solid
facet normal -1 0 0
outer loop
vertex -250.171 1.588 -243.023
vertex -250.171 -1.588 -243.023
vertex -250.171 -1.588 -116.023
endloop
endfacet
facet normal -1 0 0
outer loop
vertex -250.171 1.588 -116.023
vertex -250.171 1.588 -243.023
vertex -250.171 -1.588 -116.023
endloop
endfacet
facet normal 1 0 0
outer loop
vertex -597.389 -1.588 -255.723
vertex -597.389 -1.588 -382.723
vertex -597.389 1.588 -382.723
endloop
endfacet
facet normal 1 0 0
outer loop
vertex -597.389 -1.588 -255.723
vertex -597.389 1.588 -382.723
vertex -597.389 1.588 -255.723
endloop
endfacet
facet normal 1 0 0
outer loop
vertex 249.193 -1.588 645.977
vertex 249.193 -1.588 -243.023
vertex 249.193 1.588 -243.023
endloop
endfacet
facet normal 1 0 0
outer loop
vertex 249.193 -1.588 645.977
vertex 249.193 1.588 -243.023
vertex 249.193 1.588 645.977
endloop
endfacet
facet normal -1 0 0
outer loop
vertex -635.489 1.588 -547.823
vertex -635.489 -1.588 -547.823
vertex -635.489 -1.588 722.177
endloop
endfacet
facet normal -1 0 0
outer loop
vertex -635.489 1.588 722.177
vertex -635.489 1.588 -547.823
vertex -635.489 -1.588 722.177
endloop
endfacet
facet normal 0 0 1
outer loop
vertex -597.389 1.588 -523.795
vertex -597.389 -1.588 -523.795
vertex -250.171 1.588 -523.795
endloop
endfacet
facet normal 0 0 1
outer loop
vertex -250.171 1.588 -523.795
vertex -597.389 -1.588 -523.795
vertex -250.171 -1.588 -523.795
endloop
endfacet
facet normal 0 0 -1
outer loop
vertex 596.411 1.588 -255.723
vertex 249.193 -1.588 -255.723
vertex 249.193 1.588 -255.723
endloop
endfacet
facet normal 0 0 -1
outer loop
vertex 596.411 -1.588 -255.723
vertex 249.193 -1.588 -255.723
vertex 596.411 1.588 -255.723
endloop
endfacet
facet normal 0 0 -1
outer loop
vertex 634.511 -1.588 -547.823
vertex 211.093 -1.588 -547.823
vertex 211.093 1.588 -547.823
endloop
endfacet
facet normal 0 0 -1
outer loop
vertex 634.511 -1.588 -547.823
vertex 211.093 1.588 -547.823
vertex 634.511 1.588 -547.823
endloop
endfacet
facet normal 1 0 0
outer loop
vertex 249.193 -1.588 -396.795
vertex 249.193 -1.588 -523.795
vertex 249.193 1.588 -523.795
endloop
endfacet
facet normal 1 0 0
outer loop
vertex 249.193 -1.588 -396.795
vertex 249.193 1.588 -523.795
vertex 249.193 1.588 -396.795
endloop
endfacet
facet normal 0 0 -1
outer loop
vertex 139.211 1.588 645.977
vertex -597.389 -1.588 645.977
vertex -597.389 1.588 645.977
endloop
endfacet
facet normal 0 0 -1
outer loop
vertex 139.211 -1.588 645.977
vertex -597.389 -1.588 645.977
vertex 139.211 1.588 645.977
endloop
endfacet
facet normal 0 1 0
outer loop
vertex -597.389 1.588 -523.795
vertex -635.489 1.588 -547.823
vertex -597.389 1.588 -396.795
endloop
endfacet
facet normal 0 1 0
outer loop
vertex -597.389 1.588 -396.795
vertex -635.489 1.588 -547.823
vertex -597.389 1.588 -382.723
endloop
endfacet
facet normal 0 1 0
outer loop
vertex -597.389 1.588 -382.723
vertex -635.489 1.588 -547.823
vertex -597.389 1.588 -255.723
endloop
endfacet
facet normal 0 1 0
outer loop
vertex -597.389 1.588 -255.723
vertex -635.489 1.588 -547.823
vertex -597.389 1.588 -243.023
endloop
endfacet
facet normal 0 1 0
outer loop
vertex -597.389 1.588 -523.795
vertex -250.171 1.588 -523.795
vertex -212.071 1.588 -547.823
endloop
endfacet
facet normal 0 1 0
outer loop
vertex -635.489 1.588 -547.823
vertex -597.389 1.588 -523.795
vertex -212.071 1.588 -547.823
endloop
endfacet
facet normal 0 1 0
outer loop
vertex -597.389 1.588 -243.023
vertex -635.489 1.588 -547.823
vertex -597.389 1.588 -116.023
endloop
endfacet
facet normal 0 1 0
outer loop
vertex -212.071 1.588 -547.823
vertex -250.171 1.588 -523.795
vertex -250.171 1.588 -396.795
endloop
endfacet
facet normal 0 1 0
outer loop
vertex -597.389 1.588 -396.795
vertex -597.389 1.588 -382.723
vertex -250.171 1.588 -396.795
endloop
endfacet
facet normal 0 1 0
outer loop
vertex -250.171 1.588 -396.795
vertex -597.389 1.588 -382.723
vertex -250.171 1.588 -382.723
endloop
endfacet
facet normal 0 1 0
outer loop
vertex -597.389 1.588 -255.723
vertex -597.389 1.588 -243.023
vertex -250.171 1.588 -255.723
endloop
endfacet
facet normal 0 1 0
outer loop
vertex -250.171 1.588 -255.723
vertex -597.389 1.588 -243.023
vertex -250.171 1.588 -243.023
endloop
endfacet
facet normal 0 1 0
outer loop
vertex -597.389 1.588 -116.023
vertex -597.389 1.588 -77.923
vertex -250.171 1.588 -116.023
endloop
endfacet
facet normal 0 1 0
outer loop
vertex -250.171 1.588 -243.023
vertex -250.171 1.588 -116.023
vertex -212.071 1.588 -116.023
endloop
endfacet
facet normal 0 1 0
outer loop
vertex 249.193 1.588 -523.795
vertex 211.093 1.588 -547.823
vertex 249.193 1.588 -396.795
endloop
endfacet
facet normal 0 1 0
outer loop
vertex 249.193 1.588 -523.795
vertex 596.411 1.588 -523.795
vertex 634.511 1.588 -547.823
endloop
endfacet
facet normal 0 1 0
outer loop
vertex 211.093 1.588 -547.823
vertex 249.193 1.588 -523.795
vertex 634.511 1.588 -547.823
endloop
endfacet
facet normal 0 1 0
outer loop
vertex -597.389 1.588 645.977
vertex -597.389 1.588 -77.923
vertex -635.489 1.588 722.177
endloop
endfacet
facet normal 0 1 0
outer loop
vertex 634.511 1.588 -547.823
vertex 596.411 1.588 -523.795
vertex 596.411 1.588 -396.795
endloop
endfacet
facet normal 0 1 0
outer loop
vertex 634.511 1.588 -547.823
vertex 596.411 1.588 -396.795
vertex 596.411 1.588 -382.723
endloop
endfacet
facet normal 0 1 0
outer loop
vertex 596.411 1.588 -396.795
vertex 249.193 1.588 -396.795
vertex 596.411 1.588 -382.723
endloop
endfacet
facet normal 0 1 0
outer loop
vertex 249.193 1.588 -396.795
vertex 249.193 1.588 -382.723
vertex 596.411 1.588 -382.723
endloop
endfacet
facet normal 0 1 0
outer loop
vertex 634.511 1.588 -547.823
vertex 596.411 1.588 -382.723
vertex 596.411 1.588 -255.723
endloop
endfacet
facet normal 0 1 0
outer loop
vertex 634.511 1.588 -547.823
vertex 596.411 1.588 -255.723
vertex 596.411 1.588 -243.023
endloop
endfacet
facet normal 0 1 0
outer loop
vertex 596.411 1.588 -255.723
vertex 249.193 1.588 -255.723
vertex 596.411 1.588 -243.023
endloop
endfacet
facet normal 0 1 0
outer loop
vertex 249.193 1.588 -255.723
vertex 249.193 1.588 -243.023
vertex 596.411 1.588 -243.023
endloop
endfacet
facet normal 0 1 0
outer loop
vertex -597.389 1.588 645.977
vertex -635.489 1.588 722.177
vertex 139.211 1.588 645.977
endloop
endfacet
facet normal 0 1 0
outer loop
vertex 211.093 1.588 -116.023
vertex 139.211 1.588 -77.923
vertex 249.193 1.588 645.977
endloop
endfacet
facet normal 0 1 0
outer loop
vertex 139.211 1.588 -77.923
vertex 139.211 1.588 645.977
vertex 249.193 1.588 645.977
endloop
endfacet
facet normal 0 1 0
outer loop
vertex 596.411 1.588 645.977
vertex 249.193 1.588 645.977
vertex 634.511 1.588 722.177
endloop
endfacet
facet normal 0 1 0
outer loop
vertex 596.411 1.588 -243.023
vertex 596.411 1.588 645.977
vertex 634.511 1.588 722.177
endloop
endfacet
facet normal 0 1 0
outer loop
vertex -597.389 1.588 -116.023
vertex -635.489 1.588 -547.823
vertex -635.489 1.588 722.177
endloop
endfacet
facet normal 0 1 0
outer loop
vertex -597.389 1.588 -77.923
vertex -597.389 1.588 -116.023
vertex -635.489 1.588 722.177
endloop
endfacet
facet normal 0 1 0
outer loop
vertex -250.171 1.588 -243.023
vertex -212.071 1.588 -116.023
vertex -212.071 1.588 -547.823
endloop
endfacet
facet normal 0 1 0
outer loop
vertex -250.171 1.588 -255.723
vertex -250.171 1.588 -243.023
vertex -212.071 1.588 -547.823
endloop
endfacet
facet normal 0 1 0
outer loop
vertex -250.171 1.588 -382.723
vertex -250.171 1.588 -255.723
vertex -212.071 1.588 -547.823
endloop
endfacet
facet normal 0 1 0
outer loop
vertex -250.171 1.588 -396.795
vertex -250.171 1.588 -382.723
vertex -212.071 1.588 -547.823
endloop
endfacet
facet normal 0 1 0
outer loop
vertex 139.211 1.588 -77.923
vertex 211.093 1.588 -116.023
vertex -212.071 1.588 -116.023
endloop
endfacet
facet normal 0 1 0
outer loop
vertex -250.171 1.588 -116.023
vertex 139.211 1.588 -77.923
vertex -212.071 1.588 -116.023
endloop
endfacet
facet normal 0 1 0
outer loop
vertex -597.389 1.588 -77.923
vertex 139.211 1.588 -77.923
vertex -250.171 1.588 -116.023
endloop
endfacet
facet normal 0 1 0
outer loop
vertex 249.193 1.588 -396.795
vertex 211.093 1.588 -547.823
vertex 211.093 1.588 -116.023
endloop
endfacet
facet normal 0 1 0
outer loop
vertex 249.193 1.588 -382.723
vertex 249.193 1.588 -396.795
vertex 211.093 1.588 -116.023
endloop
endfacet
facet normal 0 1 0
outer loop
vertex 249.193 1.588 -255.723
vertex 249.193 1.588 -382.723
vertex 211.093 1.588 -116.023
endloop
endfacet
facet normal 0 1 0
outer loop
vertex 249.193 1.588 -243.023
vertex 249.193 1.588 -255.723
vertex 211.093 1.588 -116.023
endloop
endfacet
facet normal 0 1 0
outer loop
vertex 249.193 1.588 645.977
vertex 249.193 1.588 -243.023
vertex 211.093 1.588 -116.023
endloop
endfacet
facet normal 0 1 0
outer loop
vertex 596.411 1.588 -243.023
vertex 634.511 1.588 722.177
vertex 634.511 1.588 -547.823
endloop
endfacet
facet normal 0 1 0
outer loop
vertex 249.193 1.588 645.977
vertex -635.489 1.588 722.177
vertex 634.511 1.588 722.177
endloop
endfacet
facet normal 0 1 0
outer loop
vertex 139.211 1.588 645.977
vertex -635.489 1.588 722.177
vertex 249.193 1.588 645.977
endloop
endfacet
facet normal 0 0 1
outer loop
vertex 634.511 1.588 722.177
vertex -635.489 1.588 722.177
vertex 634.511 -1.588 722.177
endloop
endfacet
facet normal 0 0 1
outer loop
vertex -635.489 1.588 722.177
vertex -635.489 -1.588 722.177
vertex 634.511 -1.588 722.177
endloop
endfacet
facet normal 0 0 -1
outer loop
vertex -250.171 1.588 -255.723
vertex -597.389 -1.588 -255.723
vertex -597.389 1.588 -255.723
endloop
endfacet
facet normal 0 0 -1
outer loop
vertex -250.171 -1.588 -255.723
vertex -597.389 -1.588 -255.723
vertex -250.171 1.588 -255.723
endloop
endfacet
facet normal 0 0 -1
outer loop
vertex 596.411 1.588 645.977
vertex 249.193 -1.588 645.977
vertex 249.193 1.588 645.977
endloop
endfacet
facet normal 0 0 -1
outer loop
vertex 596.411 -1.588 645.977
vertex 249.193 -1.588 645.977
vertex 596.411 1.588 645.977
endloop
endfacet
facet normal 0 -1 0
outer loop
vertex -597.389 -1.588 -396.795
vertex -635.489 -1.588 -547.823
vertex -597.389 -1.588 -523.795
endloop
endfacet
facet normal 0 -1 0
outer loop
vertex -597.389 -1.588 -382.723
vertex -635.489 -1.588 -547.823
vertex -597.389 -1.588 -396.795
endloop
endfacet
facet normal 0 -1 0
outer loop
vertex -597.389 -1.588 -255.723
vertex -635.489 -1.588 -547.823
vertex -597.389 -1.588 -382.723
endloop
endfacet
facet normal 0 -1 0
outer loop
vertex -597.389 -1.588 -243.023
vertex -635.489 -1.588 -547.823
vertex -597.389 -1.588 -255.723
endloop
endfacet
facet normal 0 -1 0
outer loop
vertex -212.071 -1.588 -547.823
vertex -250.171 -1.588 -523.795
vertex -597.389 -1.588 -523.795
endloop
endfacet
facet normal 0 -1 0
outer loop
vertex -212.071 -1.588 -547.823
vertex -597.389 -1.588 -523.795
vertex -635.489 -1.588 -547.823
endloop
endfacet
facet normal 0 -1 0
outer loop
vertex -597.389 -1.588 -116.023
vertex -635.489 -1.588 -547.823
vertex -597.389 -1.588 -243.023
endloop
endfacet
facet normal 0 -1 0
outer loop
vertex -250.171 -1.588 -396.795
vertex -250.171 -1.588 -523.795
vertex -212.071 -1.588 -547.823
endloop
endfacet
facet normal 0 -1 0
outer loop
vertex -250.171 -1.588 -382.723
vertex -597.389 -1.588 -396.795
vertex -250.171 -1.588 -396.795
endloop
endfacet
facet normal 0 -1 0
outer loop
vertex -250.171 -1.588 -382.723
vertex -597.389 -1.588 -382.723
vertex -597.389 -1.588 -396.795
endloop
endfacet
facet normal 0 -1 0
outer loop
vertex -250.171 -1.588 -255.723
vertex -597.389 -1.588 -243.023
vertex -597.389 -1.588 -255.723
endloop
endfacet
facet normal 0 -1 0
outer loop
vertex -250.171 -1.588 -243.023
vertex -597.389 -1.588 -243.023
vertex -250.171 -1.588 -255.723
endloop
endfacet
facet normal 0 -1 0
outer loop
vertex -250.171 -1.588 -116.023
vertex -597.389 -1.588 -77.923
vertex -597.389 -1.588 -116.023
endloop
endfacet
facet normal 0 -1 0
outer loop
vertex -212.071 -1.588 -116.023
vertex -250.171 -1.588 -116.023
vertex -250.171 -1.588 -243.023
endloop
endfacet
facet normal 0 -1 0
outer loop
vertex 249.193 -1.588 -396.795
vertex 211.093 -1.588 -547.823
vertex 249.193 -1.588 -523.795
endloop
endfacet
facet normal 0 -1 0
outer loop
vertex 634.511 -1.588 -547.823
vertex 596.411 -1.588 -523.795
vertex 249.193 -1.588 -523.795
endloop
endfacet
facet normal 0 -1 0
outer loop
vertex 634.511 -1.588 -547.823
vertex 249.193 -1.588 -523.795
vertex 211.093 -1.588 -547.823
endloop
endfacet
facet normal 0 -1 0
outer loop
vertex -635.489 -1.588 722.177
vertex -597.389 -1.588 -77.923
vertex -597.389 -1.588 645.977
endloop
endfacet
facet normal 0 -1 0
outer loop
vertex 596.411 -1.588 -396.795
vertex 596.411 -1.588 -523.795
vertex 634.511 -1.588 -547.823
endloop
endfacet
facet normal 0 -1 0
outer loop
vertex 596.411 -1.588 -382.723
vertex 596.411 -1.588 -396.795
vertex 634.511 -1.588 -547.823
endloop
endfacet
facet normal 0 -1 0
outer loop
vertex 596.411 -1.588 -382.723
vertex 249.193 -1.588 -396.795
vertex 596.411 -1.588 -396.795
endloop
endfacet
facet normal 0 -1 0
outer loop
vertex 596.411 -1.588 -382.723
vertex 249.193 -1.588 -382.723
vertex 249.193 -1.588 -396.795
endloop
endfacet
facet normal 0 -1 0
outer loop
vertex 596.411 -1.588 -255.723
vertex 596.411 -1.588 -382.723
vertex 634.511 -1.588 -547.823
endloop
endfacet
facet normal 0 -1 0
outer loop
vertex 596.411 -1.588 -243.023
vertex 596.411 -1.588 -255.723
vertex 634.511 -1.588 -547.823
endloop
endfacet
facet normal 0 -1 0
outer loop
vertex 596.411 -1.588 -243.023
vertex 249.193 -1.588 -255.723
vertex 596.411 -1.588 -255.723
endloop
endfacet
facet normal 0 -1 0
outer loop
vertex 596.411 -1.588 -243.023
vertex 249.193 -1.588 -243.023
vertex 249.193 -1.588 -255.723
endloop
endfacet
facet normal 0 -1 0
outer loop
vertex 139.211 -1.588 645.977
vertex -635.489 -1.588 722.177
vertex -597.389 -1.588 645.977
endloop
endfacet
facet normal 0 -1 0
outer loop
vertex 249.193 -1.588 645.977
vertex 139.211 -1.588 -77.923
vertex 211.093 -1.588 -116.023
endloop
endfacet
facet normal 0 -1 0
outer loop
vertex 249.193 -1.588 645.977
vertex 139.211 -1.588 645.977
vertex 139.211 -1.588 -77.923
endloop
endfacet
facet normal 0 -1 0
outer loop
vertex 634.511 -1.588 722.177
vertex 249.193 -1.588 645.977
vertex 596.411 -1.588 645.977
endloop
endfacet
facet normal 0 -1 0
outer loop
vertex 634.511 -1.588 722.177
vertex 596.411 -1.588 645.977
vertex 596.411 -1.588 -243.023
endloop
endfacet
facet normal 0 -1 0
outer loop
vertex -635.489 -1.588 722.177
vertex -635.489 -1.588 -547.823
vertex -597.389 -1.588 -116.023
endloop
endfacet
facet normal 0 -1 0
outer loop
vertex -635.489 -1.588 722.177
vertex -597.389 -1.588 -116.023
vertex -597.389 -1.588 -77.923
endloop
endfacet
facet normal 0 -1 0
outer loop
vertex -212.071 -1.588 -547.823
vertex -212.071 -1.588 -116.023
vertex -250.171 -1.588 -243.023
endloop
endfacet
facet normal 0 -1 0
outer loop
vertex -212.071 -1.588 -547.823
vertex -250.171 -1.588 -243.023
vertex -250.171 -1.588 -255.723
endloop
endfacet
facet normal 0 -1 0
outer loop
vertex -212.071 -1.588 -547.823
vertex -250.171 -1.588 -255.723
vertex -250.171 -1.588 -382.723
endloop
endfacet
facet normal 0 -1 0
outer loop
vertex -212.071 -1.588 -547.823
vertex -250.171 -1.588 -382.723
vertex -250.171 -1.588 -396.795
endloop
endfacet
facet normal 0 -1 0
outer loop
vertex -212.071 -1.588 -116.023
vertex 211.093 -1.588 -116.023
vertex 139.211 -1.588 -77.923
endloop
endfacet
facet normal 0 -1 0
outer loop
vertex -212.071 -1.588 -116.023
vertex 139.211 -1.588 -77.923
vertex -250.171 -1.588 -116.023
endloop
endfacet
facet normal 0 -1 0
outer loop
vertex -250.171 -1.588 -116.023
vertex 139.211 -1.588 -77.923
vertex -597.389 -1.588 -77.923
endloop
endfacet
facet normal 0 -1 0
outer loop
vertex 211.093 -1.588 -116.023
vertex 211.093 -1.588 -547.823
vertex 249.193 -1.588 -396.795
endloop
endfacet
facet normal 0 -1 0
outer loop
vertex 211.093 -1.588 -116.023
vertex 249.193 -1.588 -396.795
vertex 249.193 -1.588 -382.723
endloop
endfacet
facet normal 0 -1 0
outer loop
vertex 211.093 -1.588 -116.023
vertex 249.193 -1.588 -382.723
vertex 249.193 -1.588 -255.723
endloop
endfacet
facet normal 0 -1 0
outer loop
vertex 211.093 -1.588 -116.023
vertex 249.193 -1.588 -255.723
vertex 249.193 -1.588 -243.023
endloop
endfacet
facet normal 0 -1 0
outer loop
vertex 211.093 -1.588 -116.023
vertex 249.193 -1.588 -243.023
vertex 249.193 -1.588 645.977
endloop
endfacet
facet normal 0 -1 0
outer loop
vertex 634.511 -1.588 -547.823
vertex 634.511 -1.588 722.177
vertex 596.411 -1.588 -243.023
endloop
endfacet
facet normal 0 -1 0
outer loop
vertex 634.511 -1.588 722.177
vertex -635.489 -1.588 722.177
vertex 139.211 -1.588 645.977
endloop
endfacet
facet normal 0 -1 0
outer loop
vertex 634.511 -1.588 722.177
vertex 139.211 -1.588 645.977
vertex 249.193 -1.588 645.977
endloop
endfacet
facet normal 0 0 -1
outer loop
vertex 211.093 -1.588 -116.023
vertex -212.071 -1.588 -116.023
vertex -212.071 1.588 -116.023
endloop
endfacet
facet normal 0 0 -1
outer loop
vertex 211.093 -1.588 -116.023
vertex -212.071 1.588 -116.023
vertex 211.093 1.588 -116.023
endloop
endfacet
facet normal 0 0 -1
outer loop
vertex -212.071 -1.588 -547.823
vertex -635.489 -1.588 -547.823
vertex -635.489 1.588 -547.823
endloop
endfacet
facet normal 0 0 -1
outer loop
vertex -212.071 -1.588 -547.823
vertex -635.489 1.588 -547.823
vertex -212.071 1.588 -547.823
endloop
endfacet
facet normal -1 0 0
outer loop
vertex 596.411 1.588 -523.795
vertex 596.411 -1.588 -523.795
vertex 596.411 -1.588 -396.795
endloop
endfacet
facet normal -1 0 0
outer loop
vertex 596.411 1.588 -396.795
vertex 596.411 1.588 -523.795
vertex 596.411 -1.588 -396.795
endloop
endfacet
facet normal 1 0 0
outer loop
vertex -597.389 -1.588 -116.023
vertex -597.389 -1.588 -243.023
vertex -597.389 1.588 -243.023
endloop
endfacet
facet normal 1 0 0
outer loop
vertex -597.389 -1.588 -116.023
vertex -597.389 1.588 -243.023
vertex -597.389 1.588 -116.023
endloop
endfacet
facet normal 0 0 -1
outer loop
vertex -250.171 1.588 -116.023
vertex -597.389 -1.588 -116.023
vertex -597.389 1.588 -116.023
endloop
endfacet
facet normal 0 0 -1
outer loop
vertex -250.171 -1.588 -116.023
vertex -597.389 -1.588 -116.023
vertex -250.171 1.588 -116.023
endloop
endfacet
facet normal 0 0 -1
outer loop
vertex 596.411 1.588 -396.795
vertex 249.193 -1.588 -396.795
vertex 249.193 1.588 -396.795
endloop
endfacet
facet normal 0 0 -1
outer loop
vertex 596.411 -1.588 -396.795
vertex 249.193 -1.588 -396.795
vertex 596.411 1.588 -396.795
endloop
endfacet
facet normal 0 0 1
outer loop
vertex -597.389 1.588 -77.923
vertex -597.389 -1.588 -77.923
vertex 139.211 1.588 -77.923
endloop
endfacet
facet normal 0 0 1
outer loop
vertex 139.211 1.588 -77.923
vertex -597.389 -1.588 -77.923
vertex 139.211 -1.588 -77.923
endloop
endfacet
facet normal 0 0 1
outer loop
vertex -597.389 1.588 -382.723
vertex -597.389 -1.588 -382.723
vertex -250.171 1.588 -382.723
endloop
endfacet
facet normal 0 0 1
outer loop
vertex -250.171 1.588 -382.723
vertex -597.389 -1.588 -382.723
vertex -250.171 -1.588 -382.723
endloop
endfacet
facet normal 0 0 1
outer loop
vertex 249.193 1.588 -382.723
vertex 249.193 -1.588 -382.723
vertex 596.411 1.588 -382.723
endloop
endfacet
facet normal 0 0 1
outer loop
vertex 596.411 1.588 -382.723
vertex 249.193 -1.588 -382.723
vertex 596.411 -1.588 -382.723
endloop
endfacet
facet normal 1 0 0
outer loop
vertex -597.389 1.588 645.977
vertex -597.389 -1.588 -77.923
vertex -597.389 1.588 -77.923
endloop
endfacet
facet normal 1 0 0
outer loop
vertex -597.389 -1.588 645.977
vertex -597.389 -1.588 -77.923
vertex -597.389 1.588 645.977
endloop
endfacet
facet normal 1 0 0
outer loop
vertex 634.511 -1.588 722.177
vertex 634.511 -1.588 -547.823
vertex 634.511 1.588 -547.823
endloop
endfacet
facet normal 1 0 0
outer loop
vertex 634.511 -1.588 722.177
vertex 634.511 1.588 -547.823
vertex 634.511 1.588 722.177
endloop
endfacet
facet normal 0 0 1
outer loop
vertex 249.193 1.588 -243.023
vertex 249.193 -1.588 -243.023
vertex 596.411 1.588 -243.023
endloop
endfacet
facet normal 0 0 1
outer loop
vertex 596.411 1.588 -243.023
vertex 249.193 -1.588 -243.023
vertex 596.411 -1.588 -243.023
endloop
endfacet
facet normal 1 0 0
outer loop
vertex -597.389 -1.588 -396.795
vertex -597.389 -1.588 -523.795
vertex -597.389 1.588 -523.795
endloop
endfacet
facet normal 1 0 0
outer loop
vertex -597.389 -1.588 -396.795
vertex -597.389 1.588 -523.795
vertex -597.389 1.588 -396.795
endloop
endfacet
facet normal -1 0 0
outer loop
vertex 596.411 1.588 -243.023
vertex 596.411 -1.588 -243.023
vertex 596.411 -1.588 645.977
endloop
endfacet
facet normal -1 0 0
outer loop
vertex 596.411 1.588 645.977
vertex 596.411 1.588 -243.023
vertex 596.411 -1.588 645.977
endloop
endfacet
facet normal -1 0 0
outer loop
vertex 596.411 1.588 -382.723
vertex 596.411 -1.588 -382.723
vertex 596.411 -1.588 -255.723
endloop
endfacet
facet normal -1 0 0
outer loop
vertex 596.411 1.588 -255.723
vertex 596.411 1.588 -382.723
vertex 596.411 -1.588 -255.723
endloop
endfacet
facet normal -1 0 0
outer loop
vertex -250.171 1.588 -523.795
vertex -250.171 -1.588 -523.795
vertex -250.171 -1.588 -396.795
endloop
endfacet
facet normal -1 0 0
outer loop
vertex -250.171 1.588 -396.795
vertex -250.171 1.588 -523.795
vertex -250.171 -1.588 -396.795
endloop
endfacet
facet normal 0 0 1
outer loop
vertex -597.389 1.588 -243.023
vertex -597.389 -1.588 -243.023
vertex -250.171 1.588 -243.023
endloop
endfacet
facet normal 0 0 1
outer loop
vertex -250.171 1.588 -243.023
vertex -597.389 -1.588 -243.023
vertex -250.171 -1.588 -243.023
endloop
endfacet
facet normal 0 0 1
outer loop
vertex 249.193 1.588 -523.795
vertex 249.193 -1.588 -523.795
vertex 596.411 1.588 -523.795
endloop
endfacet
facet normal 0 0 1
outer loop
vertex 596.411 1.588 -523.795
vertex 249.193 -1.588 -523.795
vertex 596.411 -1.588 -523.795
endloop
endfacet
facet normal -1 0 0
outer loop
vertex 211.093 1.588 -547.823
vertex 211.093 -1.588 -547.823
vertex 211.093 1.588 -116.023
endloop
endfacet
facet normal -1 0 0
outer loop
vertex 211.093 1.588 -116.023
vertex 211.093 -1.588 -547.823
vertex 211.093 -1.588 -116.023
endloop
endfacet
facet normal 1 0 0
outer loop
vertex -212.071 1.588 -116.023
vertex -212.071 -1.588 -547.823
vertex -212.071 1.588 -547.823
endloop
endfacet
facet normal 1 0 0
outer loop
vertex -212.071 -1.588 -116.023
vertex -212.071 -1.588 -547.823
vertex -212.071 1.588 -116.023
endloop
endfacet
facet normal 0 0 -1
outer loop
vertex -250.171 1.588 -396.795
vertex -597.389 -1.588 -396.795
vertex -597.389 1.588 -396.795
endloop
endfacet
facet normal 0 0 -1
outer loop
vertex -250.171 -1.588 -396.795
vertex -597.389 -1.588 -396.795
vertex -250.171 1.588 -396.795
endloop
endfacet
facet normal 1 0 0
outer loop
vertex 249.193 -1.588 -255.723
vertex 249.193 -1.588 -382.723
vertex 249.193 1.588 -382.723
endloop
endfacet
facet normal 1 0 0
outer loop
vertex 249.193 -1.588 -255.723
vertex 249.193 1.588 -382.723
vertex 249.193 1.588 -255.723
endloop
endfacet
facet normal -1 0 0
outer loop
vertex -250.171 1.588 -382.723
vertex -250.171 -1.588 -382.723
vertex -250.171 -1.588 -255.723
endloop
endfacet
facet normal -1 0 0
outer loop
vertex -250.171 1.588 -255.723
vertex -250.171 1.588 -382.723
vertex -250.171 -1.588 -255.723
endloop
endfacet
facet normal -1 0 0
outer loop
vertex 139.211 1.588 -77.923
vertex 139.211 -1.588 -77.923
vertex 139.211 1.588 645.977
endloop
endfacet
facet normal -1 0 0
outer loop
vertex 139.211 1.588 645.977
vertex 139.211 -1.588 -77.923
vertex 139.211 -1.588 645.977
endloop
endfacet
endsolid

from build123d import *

# Parameters (mm, degrees)
F0_W      = 1270
F0_H      = 1270
F1_DEPTH  = 1.5875
F2_W      = 736.6
F2_H      = 723.9
F3_DEPTH  = 3.176
F2_W_2    = 347.218
F2_H_2    = 889
F4_DEPTH  = 3.176
F2_H_3    = 127
F5_DEPTH  = 3.176
F6_DEPTH  = 3.176
F7_DEPTH  = 3.176
F2_W_3    = 423.164
F2_H_4    = 431.8
F8_DEPTH  = 3.176
F9_DEPTH  = 3.176
F10_DEPTH = 3.176


with BuildPart() as f1:
    # F0 (on Front) → F1 (new body, symmetric)
    with BuildSketch(Plane.XZ):
        with Locations((-0.489235, 87.176618)):
            Rectangle(F0_W, F0_H)
    extrude(amount=F1_DEPTH, both=True)

    # F2 (on face) → F3 (cut, through all)
    with BuildSketch(Plane.XZ.offset(1.5875)):
        with Locations((-229.089235, 284.026618)):
            Rectangle(F2_W, F2_H)
    extrude(amount=-F3_DEPTH, mode=Mode.SUBTRACT)

    # F2 (on face) → F4 (cut, through all)
    with BuildSketch(Plane.XZ.offset(1.5875)):
        with Locations((422.801765, 201.476618)):
            Rectangle(F2_W_2, F2_H_2)
    extrude(amount=-F4_DEPTH, mode=Mode.SUBTRACT)

    # F2 (on face) → F5 (cut, through all)
    with BuildSketch(Plane.XZ.offset(1.5875)):
        with Locations((-423.780235, -179.523382)):
            Rectangle(F2_W_2, F2_H_3)
    extrude(amount=-F5_DEPTH, mode=Mode.SUBTRACT)

    # F2 (on face) → F6 (cut, through all)
    with BuildSketch(Plane.XZ.offset(1.5875)):
        with Locations((-423.780235, -319.223382)):
            Rectangle(F2_W_2, F2_H_3)
    extrude(amount=-F6_DEPTH, mode=Mode.SUBTRACT)

    # F2 (on face) → F7 (cut, through all)
    with BuildSketch(Plane.XZ.offset(1.5875)):
        with Locations((-423.780235, -460.295247)):
            Rectangle(F2_W_2, F2_H_3)
    extrude(amount=-F7_DEPTH, mode=Mode.SUBTRACT)

    # F2 (on face) → F8 (cut, through all)
    with BuildSketch(Plane.XZ.offset(1.5875)):
        with Locations((-0.489235, -331.923382)):
            Rectangle(F2_W_3, F2_H_4)
    extrude(amount=-F8_DEPTH, mode=Mode.SUBTRACT)

    # F2 (on face) → F9 (cut, through all)
    with BuildSketch(Plane.XZ.offset(1.5875)):
        with Locations((422.801765, -319.223382)):
            Rectangle(F2_W_2, F2_H_3)
    extrude(amount=-F9_DEPTH, mode=Mode.SUBTRACT)

    # F2 (on face) → F10 (cut, through all)
    with BuildSketch(Plane.XZ.offset(1.5875)):
        with Locations((422.801765, -460.295247)):
            Rectangle(F2_W_2, F2_H_3)
    extrude(amount=-F10_DEPTH, mode=Mode.SUBTRACT)


solid = f1.part
